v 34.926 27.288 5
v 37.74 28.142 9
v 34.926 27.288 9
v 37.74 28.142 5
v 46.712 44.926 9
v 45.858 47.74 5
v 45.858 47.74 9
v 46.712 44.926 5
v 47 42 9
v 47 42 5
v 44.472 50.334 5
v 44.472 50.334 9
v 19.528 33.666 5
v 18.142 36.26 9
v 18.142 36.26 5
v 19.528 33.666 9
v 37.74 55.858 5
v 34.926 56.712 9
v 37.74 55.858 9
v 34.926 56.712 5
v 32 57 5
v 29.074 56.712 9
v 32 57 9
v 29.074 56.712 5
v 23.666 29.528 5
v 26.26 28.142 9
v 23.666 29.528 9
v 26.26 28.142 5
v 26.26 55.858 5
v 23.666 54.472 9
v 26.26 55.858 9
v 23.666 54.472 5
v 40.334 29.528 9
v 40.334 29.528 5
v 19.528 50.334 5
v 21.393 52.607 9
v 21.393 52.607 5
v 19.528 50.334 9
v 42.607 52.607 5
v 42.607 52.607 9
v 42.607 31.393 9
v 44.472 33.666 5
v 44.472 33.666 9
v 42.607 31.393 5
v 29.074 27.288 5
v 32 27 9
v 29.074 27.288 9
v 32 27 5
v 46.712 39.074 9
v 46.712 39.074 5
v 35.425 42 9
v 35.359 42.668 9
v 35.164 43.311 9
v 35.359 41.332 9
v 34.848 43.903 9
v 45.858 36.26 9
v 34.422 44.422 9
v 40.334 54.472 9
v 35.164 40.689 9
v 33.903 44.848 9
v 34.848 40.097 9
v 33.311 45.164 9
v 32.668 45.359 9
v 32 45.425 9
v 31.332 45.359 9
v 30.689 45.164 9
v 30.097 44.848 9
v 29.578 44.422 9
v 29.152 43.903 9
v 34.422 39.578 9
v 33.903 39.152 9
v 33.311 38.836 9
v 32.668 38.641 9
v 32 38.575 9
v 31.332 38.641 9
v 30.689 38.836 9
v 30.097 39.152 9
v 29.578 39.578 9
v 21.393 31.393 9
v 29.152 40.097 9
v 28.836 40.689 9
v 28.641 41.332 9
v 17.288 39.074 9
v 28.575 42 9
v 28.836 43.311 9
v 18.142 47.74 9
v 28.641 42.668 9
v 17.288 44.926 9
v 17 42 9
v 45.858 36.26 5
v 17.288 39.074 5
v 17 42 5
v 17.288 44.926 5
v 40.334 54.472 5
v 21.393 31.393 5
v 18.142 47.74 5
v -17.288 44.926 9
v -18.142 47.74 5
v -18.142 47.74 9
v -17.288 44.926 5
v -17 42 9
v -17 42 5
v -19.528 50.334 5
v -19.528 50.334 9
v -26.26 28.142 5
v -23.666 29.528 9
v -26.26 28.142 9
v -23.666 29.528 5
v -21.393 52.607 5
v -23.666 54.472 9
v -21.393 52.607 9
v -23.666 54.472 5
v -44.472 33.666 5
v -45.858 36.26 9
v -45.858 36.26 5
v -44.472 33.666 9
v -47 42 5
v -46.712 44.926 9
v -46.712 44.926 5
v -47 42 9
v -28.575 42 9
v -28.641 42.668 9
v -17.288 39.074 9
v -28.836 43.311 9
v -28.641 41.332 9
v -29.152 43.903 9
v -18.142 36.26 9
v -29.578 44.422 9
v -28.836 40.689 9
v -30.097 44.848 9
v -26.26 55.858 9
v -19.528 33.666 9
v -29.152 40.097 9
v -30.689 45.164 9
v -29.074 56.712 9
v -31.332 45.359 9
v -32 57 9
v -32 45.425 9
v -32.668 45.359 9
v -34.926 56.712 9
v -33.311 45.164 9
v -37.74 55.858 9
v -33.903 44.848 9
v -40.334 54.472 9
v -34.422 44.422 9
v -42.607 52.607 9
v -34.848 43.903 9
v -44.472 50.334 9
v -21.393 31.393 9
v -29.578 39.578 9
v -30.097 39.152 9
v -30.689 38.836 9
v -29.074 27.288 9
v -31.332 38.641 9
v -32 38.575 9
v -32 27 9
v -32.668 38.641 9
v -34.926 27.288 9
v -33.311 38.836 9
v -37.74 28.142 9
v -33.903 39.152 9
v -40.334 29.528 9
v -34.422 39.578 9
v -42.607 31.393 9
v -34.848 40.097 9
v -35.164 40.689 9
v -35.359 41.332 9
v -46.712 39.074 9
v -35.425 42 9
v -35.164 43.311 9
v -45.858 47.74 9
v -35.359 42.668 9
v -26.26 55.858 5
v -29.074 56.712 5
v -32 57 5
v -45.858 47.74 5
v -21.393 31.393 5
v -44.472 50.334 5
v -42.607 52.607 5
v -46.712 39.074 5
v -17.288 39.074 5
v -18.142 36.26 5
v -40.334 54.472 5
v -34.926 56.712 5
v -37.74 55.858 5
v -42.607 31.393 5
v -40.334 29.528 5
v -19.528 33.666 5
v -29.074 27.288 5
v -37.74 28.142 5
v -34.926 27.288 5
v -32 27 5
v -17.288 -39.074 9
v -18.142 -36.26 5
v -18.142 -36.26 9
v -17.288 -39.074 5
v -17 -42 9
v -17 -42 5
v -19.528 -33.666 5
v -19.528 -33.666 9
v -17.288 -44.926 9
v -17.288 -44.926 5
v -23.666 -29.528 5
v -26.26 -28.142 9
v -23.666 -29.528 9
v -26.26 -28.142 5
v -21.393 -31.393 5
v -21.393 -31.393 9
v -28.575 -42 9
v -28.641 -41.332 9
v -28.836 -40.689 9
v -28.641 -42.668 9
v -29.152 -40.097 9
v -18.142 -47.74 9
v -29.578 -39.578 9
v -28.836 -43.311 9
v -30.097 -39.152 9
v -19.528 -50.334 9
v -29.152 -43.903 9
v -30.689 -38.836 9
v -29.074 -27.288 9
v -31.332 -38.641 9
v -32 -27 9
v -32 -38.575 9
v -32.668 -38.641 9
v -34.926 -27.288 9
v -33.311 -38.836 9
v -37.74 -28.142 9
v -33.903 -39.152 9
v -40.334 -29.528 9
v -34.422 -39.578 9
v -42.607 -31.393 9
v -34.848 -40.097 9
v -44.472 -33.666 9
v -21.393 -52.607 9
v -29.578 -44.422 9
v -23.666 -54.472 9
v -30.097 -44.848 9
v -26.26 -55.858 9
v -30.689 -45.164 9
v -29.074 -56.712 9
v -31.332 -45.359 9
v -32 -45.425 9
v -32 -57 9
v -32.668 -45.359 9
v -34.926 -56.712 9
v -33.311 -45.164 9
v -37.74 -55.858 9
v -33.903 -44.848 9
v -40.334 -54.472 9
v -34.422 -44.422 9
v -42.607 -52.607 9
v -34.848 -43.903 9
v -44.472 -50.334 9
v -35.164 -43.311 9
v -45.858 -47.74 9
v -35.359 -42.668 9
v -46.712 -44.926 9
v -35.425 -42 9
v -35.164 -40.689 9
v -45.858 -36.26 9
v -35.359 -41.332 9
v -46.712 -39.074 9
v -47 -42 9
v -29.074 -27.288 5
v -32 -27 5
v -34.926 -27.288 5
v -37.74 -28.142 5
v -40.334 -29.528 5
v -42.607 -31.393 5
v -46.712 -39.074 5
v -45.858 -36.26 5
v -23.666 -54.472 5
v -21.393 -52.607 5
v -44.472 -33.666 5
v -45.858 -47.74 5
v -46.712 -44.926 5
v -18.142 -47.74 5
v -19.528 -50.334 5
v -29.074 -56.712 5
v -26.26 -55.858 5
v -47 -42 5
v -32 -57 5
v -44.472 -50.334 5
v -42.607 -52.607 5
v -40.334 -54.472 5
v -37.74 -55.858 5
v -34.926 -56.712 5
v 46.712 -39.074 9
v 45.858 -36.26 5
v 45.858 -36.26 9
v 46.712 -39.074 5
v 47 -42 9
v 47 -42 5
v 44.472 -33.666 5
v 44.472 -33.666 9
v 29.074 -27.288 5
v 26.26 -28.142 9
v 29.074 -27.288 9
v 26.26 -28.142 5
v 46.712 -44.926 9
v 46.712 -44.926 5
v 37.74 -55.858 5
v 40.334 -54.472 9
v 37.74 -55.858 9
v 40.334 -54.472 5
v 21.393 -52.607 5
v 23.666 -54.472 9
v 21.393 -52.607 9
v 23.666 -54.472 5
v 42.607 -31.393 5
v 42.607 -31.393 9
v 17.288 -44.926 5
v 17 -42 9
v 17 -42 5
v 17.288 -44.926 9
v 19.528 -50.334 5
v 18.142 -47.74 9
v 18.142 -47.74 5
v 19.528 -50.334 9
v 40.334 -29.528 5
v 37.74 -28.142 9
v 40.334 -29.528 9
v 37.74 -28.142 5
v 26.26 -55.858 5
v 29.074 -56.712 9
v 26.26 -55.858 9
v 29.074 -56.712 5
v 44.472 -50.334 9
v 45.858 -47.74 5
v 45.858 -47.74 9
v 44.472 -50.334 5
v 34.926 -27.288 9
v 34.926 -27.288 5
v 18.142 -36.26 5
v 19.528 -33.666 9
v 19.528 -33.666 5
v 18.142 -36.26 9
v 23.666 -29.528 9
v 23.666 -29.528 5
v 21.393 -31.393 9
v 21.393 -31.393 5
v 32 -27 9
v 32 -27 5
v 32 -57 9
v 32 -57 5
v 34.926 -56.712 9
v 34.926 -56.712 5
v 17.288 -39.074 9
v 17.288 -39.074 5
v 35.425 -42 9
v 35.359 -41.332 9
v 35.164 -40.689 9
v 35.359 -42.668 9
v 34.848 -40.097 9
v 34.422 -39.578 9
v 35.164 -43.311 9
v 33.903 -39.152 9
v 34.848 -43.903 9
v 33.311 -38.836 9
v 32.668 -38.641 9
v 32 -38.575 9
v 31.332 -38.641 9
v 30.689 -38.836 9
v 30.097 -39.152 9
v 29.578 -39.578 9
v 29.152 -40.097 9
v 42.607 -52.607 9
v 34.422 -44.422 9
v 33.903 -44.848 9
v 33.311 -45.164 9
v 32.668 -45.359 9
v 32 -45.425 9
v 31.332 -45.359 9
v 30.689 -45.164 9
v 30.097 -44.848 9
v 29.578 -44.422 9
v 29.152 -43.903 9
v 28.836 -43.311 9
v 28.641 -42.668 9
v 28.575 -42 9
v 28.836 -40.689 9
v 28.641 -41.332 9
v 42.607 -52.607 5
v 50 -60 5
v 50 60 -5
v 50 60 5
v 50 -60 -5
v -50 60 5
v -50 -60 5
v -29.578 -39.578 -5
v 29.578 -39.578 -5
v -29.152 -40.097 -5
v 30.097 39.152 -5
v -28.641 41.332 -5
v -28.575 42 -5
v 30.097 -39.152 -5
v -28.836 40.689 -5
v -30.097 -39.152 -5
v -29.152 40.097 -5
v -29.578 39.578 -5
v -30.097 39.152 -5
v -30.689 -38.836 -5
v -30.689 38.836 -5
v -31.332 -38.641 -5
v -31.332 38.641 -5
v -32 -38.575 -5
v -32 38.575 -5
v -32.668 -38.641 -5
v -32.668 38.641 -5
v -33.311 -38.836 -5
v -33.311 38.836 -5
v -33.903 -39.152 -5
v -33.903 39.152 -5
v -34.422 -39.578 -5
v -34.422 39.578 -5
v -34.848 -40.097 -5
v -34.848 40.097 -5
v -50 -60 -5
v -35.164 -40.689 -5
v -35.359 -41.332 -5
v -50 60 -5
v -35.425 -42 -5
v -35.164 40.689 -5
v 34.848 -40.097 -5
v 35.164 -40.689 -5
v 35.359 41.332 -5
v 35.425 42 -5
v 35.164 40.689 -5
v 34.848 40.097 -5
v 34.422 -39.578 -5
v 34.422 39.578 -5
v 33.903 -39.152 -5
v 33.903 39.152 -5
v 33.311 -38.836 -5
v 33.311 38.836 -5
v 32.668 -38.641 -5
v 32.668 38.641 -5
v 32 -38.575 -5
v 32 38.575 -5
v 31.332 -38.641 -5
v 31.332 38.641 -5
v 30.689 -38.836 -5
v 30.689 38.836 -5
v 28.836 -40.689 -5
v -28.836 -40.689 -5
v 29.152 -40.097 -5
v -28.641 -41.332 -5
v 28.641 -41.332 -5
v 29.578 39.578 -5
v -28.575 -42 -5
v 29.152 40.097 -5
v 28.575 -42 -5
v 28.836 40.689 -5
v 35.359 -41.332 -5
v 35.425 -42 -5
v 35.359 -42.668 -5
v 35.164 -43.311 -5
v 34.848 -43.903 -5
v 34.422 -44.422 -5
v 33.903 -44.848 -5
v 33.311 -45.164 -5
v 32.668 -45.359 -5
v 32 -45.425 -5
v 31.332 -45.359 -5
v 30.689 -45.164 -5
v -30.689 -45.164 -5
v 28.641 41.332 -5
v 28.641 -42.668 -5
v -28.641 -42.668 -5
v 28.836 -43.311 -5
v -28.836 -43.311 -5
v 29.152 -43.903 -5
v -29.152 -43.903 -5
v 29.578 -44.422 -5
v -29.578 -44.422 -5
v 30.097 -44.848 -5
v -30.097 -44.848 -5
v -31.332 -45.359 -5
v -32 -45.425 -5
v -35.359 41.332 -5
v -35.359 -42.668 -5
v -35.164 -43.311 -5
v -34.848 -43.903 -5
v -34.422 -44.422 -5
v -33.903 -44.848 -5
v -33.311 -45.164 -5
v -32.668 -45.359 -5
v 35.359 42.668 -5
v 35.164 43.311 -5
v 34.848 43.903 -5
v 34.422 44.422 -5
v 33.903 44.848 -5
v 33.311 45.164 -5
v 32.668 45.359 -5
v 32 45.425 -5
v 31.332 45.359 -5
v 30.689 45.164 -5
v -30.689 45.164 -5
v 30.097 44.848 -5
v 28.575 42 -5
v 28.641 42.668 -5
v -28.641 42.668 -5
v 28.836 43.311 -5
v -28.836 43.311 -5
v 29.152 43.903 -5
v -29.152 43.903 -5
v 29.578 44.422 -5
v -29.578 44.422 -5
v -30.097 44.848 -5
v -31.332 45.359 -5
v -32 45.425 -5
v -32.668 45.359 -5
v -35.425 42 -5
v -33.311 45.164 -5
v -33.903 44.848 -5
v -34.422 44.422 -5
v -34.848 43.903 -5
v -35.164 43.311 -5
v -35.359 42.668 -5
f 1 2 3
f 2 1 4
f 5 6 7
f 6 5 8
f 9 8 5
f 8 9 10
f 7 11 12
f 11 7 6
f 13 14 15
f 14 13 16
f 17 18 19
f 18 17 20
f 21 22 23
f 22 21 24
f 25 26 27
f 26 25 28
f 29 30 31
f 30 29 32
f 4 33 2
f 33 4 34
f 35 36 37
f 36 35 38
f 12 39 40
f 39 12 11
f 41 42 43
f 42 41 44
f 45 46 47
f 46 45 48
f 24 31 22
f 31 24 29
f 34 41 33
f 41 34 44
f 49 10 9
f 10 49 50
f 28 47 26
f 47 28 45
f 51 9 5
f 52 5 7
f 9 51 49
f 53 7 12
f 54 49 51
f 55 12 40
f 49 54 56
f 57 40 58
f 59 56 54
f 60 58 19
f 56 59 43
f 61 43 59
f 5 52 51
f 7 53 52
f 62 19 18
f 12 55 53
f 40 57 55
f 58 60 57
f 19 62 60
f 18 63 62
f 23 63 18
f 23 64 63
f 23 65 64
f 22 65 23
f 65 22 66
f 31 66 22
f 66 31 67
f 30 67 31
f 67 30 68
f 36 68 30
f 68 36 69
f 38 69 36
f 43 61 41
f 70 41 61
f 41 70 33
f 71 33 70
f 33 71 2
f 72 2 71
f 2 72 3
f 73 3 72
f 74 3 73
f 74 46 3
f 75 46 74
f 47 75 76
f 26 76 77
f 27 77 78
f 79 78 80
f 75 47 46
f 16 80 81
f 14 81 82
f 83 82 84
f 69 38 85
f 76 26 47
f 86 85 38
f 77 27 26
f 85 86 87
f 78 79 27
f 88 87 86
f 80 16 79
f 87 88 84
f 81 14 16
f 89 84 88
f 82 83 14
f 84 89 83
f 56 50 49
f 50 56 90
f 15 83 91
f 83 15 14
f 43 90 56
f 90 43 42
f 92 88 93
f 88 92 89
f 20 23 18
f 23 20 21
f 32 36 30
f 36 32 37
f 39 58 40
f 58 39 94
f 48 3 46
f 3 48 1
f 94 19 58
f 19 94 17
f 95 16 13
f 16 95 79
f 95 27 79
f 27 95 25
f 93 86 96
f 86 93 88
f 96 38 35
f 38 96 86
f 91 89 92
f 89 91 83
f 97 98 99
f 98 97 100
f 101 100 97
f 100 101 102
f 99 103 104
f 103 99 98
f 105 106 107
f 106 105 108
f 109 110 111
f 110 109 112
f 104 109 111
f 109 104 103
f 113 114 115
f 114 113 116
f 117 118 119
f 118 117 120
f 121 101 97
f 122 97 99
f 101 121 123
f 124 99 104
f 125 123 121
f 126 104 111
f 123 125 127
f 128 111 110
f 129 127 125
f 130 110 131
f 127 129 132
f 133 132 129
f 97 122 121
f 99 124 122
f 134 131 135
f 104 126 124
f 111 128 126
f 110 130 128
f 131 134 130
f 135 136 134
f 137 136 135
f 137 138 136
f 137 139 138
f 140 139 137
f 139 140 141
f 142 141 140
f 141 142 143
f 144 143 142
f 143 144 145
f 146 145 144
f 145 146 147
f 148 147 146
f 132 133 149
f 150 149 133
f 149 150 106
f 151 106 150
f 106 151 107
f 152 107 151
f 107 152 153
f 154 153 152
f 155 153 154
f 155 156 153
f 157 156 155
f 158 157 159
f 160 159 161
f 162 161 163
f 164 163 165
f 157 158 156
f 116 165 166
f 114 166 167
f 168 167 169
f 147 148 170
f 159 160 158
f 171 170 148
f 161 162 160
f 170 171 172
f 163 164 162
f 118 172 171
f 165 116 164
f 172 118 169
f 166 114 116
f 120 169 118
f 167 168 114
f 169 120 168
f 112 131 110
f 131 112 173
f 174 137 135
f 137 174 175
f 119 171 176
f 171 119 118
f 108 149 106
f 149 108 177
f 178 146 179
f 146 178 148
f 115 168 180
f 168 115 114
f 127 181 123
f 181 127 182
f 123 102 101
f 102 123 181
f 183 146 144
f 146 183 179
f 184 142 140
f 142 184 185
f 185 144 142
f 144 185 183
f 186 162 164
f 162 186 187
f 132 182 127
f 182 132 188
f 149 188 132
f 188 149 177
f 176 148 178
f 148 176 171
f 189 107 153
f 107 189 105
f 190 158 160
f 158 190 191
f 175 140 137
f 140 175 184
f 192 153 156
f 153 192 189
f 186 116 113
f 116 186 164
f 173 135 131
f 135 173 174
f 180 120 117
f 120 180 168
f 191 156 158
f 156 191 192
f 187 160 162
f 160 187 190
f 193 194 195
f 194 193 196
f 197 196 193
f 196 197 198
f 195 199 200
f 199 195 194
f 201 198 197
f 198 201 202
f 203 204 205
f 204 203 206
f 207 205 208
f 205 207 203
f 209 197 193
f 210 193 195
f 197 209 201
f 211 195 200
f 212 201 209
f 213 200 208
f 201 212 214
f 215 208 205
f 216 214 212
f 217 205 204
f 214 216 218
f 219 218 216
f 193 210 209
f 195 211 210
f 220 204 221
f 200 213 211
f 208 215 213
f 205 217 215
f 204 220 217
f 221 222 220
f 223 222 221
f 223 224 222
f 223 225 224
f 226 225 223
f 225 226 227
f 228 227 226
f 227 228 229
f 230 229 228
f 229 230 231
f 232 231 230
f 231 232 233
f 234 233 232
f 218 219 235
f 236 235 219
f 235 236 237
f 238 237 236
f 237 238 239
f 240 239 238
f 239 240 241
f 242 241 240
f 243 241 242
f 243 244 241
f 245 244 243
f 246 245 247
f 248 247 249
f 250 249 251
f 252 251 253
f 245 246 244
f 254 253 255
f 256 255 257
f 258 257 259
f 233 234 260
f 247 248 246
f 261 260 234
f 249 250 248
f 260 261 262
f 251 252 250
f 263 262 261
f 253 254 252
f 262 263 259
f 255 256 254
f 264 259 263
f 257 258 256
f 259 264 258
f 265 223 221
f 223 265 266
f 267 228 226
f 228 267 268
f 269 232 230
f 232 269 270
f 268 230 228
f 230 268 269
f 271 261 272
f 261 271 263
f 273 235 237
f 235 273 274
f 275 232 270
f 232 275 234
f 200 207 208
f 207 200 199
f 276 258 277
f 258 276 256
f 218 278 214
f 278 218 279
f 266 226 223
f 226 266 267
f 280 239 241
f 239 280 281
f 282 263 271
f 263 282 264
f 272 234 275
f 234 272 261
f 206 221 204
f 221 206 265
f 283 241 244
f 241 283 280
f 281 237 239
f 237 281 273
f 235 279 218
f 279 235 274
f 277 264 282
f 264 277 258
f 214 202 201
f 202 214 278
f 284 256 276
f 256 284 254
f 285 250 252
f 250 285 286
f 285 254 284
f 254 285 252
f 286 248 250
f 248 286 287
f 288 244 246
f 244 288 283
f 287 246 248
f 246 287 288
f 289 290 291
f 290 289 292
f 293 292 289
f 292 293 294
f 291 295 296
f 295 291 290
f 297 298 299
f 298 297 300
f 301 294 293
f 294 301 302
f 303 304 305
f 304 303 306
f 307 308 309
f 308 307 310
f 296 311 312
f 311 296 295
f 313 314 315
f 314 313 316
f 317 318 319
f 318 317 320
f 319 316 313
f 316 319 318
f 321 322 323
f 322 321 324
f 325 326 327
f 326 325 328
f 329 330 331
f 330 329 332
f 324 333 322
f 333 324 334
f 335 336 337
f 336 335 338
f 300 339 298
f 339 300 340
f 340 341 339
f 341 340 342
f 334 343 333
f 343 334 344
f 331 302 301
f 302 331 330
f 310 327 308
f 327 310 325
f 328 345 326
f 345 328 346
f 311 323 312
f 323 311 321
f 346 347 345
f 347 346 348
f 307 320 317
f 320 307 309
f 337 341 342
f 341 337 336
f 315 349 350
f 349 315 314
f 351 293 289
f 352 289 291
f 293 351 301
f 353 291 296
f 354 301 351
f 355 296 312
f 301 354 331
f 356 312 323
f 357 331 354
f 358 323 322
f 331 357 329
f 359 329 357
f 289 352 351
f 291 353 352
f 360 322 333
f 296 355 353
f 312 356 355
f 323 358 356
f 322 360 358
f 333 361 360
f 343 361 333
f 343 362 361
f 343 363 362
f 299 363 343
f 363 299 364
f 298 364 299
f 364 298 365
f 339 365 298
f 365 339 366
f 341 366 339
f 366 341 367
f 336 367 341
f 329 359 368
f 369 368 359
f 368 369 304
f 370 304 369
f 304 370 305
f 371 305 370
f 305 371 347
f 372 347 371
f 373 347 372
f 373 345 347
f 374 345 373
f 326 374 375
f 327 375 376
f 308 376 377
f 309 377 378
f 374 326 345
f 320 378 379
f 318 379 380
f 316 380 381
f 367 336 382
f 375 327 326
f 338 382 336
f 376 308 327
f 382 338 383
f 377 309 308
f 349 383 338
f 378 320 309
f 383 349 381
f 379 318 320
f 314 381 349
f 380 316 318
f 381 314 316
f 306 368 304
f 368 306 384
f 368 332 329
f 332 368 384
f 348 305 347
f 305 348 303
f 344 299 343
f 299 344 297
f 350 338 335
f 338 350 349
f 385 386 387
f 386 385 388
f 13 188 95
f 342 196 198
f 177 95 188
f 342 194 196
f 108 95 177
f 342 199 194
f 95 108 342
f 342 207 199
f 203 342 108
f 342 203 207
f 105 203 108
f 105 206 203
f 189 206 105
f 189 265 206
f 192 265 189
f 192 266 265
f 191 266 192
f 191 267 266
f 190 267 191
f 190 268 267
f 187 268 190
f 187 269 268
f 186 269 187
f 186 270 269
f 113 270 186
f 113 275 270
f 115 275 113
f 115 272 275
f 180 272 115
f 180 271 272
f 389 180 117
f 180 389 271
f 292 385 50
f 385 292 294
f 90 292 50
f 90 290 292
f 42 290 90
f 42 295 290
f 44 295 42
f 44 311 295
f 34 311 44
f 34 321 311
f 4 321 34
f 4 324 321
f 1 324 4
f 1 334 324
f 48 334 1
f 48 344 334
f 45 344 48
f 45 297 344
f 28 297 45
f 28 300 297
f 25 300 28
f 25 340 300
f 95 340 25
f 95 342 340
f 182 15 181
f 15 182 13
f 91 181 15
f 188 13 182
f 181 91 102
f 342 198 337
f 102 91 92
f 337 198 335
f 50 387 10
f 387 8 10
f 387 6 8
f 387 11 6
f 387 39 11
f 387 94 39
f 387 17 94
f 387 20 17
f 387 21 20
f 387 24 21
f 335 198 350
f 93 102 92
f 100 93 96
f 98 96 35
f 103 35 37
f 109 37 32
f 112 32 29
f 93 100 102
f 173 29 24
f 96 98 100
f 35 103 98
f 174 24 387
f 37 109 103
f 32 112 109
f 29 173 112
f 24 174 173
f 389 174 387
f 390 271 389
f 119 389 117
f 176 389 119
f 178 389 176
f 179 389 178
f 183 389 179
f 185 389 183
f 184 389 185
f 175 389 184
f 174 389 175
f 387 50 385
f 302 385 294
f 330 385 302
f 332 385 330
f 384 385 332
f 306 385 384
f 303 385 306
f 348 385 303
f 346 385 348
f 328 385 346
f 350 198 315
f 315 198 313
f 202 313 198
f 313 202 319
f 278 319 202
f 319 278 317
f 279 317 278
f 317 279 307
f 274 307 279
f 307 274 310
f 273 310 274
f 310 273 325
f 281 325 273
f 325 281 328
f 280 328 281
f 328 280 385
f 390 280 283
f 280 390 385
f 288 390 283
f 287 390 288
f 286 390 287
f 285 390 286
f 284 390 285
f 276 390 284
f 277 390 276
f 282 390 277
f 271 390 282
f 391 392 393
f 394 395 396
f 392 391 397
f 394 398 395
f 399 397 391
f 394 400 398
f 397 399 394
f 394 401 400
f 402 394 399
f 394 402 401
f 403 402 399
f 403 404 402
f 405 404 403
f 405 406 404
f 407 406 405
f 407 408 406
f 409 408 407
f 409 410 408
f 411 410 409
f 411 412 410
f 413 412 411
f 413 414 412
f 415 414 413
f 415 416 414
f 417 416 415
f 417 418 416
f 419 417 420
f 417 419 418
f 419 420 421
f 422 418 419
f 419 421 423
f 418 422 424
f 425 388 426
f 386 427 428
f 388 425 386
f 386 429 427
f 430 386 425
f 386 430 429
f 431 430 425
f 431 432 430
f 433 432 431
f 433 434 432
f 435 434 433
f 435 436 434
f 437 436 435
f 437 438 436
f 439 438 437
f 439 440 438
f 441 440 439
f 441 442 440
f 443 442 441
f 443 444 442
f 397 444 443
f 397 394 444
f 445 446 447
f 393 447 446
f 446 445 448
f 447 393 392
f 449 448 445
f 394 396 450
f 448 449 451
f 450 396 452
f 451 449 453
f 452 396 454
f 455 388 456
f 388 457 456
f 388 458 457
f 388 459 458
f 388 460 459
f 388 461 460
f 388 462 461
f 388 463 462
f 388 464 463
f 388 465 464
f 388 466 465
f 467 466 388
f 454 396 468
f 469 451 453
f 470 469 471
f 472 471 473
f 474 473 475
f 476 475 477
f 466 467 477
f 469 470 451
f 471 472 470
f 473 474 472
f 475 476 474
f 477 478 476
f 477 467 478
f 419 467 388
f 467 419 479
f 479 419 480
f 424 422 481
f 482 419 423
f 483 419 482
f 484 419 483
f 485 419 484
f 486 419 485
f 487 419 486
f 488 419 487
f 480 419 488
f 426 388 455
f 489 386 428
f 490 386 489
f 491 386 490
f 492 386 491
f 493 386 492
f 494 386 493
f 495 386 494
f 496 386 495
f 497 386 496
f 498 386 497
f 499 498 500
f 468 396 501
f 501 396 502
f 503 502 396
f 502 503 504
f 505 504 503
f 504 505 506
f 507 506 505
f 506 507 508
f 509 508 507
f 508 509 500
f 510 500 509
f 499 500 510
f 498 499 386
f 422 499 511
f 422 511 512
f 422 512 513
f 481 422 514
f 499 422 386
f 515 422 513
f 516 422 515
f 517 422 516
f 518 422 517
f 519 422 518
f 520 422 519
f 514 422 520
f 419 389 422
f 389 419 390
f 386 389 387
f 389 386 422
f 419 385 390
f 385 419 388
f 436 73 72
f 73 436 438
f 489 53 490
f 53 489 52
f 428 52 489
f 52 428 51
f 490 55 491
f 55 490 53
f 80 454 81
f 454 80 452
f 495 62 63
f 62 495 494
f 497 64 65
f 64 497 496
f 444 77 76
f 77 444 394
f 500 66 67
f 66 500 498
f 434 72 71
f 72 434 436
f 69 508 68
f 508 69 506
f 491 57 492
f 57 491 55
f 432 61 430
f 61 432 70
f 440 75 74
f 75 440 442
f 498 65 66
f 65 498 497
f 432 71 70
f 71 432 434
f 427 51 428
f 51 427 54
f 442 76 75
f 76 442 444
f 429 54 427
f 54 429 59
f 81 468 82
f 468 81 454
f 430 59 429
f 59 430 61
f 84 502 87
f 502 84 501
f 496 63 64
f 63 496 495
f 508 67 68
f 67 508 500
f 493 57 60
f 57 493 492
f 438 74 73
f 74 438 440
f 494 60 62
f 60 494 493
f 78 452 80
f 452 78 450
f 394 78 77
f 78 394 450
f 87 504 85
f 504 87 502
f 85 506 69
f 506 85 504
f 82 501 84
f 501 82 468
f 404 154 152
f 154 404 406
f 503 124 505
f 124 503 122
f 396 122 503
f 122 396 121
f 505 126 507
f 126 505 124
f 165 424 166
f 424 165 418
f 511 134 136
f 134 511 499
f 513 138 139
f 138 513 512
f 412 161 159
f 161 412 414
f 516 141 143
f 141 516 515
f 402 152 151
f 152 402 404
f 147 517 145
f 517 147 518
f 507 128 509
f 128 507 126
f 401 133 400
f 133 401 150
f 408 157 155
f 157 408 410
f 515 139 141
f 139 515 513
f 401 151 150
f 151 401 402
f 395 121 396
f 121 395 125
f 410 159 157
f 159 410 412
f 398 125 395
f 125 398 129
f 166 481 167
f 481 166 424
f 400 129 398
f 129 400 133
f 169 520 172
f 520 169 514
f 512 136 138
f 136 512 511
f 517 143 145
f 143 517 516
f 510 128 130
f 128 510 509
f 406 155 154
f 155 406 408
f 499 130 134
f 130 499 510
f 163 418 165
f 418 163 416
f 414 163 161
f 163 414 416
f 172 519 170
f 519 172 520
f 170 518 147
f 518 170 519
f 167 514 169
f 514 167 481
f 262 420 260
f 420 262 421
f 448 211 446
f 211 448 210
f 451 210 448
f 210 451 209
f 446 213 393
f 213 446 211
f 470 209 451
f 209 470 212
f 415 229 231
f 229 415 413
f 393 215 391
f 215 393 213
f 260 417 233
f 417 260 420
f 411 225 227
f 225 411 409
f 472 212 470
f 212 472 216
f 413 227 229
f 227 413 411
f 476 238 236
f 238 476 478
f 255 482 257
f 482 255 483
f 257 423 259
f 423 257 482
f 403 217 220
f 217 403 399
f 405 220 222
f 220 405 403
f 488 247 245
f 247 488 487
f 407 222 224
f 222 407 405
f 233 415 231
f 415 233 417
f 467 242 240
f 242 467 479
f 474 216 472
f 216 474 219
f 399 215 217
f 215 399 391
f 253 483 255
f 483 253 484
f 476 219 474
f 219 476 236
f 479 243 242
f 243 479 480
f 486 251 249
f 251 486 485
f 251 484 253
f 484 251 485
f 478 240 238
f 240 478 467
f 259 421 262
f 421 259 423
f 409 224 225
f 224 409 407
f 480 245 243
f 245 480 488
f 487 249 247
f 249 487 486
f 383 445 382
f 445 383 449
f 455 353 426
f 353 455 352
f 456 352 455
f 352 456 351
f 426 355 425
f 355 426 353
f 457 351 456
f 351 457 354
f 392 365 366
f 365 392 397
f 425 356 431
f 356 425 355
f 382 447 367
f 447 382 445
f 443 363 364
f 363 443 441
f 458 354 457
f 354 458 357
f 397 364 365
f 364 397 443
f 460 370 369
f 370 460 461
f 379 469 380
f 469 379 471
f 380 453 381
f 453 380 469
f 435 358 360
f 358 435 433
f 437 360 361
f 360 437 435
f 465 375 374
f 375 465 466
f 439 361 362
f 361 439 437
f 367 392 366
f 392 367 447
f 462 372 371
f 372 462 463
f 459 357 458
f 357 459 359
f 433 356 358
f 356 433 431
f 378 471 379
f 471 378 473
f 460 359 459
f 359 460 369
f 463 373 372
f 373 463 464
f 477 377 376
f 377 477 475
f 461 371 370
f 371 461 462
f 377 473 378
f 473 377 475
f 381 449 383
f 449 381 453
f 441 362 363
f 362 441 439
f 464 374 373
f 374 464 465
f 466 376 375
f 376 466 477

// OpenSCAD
$fn = 32;

// ----------------------------------------------------------------------
// Anchor pads 100 x 120 x 14
// four corner bosses with anchor holes
// ----------------------------------------------------------------------

// --- parameters (mm) ---
plate = [100, 120, 10];  // base plate size (x, y, z)
pads = 4;                // boss count, one per corner
edge = 18;               // boss centre offset from the plate edge
boss_d = 30;             // boss diameter
boss_h = 4;              // boss height above the base plate
bore_d = 6.6;            // nominal hole diameter from the drawing
print_allowance = 0.25;  // clearance added for printing

// --- derived feature positions (mm) ---
hole_d = bore_d + print_allowance;  // = 6.85   hole diameter as printed
height = plate[2] + boss_h;         // = 14   overall height of the part
corner_x = plate[0] / 2 - edge;     // = 32   boss centre X
corner_y = plate[1] / 2 - edge;     // = 42   boss centre Y
feature_centers = [
  [corner_x, corner_y],
  [-corner_x, corner_y],
  [-corner_x, -corner_y],
  [corner_x, -corner_y]
];   // boss centres, anchor holes are drilled there

// base plate, four bosses standing on it, anchor holes all the way through
difference() {
  union() {
    cube(plate, center = true);
    for (centre = feature_centers)
      translate([centre[0], centre[1], plate[2] / 2 - 1])
        cylinder(d = boss_d, h = boss_h + 1);
  }
  for (centre = feature_centers)
    translate([centre[0], centre[1], -height])
      cylinder(d = hole_d, h = 2 * height + 2);  // through boss and plate
}
